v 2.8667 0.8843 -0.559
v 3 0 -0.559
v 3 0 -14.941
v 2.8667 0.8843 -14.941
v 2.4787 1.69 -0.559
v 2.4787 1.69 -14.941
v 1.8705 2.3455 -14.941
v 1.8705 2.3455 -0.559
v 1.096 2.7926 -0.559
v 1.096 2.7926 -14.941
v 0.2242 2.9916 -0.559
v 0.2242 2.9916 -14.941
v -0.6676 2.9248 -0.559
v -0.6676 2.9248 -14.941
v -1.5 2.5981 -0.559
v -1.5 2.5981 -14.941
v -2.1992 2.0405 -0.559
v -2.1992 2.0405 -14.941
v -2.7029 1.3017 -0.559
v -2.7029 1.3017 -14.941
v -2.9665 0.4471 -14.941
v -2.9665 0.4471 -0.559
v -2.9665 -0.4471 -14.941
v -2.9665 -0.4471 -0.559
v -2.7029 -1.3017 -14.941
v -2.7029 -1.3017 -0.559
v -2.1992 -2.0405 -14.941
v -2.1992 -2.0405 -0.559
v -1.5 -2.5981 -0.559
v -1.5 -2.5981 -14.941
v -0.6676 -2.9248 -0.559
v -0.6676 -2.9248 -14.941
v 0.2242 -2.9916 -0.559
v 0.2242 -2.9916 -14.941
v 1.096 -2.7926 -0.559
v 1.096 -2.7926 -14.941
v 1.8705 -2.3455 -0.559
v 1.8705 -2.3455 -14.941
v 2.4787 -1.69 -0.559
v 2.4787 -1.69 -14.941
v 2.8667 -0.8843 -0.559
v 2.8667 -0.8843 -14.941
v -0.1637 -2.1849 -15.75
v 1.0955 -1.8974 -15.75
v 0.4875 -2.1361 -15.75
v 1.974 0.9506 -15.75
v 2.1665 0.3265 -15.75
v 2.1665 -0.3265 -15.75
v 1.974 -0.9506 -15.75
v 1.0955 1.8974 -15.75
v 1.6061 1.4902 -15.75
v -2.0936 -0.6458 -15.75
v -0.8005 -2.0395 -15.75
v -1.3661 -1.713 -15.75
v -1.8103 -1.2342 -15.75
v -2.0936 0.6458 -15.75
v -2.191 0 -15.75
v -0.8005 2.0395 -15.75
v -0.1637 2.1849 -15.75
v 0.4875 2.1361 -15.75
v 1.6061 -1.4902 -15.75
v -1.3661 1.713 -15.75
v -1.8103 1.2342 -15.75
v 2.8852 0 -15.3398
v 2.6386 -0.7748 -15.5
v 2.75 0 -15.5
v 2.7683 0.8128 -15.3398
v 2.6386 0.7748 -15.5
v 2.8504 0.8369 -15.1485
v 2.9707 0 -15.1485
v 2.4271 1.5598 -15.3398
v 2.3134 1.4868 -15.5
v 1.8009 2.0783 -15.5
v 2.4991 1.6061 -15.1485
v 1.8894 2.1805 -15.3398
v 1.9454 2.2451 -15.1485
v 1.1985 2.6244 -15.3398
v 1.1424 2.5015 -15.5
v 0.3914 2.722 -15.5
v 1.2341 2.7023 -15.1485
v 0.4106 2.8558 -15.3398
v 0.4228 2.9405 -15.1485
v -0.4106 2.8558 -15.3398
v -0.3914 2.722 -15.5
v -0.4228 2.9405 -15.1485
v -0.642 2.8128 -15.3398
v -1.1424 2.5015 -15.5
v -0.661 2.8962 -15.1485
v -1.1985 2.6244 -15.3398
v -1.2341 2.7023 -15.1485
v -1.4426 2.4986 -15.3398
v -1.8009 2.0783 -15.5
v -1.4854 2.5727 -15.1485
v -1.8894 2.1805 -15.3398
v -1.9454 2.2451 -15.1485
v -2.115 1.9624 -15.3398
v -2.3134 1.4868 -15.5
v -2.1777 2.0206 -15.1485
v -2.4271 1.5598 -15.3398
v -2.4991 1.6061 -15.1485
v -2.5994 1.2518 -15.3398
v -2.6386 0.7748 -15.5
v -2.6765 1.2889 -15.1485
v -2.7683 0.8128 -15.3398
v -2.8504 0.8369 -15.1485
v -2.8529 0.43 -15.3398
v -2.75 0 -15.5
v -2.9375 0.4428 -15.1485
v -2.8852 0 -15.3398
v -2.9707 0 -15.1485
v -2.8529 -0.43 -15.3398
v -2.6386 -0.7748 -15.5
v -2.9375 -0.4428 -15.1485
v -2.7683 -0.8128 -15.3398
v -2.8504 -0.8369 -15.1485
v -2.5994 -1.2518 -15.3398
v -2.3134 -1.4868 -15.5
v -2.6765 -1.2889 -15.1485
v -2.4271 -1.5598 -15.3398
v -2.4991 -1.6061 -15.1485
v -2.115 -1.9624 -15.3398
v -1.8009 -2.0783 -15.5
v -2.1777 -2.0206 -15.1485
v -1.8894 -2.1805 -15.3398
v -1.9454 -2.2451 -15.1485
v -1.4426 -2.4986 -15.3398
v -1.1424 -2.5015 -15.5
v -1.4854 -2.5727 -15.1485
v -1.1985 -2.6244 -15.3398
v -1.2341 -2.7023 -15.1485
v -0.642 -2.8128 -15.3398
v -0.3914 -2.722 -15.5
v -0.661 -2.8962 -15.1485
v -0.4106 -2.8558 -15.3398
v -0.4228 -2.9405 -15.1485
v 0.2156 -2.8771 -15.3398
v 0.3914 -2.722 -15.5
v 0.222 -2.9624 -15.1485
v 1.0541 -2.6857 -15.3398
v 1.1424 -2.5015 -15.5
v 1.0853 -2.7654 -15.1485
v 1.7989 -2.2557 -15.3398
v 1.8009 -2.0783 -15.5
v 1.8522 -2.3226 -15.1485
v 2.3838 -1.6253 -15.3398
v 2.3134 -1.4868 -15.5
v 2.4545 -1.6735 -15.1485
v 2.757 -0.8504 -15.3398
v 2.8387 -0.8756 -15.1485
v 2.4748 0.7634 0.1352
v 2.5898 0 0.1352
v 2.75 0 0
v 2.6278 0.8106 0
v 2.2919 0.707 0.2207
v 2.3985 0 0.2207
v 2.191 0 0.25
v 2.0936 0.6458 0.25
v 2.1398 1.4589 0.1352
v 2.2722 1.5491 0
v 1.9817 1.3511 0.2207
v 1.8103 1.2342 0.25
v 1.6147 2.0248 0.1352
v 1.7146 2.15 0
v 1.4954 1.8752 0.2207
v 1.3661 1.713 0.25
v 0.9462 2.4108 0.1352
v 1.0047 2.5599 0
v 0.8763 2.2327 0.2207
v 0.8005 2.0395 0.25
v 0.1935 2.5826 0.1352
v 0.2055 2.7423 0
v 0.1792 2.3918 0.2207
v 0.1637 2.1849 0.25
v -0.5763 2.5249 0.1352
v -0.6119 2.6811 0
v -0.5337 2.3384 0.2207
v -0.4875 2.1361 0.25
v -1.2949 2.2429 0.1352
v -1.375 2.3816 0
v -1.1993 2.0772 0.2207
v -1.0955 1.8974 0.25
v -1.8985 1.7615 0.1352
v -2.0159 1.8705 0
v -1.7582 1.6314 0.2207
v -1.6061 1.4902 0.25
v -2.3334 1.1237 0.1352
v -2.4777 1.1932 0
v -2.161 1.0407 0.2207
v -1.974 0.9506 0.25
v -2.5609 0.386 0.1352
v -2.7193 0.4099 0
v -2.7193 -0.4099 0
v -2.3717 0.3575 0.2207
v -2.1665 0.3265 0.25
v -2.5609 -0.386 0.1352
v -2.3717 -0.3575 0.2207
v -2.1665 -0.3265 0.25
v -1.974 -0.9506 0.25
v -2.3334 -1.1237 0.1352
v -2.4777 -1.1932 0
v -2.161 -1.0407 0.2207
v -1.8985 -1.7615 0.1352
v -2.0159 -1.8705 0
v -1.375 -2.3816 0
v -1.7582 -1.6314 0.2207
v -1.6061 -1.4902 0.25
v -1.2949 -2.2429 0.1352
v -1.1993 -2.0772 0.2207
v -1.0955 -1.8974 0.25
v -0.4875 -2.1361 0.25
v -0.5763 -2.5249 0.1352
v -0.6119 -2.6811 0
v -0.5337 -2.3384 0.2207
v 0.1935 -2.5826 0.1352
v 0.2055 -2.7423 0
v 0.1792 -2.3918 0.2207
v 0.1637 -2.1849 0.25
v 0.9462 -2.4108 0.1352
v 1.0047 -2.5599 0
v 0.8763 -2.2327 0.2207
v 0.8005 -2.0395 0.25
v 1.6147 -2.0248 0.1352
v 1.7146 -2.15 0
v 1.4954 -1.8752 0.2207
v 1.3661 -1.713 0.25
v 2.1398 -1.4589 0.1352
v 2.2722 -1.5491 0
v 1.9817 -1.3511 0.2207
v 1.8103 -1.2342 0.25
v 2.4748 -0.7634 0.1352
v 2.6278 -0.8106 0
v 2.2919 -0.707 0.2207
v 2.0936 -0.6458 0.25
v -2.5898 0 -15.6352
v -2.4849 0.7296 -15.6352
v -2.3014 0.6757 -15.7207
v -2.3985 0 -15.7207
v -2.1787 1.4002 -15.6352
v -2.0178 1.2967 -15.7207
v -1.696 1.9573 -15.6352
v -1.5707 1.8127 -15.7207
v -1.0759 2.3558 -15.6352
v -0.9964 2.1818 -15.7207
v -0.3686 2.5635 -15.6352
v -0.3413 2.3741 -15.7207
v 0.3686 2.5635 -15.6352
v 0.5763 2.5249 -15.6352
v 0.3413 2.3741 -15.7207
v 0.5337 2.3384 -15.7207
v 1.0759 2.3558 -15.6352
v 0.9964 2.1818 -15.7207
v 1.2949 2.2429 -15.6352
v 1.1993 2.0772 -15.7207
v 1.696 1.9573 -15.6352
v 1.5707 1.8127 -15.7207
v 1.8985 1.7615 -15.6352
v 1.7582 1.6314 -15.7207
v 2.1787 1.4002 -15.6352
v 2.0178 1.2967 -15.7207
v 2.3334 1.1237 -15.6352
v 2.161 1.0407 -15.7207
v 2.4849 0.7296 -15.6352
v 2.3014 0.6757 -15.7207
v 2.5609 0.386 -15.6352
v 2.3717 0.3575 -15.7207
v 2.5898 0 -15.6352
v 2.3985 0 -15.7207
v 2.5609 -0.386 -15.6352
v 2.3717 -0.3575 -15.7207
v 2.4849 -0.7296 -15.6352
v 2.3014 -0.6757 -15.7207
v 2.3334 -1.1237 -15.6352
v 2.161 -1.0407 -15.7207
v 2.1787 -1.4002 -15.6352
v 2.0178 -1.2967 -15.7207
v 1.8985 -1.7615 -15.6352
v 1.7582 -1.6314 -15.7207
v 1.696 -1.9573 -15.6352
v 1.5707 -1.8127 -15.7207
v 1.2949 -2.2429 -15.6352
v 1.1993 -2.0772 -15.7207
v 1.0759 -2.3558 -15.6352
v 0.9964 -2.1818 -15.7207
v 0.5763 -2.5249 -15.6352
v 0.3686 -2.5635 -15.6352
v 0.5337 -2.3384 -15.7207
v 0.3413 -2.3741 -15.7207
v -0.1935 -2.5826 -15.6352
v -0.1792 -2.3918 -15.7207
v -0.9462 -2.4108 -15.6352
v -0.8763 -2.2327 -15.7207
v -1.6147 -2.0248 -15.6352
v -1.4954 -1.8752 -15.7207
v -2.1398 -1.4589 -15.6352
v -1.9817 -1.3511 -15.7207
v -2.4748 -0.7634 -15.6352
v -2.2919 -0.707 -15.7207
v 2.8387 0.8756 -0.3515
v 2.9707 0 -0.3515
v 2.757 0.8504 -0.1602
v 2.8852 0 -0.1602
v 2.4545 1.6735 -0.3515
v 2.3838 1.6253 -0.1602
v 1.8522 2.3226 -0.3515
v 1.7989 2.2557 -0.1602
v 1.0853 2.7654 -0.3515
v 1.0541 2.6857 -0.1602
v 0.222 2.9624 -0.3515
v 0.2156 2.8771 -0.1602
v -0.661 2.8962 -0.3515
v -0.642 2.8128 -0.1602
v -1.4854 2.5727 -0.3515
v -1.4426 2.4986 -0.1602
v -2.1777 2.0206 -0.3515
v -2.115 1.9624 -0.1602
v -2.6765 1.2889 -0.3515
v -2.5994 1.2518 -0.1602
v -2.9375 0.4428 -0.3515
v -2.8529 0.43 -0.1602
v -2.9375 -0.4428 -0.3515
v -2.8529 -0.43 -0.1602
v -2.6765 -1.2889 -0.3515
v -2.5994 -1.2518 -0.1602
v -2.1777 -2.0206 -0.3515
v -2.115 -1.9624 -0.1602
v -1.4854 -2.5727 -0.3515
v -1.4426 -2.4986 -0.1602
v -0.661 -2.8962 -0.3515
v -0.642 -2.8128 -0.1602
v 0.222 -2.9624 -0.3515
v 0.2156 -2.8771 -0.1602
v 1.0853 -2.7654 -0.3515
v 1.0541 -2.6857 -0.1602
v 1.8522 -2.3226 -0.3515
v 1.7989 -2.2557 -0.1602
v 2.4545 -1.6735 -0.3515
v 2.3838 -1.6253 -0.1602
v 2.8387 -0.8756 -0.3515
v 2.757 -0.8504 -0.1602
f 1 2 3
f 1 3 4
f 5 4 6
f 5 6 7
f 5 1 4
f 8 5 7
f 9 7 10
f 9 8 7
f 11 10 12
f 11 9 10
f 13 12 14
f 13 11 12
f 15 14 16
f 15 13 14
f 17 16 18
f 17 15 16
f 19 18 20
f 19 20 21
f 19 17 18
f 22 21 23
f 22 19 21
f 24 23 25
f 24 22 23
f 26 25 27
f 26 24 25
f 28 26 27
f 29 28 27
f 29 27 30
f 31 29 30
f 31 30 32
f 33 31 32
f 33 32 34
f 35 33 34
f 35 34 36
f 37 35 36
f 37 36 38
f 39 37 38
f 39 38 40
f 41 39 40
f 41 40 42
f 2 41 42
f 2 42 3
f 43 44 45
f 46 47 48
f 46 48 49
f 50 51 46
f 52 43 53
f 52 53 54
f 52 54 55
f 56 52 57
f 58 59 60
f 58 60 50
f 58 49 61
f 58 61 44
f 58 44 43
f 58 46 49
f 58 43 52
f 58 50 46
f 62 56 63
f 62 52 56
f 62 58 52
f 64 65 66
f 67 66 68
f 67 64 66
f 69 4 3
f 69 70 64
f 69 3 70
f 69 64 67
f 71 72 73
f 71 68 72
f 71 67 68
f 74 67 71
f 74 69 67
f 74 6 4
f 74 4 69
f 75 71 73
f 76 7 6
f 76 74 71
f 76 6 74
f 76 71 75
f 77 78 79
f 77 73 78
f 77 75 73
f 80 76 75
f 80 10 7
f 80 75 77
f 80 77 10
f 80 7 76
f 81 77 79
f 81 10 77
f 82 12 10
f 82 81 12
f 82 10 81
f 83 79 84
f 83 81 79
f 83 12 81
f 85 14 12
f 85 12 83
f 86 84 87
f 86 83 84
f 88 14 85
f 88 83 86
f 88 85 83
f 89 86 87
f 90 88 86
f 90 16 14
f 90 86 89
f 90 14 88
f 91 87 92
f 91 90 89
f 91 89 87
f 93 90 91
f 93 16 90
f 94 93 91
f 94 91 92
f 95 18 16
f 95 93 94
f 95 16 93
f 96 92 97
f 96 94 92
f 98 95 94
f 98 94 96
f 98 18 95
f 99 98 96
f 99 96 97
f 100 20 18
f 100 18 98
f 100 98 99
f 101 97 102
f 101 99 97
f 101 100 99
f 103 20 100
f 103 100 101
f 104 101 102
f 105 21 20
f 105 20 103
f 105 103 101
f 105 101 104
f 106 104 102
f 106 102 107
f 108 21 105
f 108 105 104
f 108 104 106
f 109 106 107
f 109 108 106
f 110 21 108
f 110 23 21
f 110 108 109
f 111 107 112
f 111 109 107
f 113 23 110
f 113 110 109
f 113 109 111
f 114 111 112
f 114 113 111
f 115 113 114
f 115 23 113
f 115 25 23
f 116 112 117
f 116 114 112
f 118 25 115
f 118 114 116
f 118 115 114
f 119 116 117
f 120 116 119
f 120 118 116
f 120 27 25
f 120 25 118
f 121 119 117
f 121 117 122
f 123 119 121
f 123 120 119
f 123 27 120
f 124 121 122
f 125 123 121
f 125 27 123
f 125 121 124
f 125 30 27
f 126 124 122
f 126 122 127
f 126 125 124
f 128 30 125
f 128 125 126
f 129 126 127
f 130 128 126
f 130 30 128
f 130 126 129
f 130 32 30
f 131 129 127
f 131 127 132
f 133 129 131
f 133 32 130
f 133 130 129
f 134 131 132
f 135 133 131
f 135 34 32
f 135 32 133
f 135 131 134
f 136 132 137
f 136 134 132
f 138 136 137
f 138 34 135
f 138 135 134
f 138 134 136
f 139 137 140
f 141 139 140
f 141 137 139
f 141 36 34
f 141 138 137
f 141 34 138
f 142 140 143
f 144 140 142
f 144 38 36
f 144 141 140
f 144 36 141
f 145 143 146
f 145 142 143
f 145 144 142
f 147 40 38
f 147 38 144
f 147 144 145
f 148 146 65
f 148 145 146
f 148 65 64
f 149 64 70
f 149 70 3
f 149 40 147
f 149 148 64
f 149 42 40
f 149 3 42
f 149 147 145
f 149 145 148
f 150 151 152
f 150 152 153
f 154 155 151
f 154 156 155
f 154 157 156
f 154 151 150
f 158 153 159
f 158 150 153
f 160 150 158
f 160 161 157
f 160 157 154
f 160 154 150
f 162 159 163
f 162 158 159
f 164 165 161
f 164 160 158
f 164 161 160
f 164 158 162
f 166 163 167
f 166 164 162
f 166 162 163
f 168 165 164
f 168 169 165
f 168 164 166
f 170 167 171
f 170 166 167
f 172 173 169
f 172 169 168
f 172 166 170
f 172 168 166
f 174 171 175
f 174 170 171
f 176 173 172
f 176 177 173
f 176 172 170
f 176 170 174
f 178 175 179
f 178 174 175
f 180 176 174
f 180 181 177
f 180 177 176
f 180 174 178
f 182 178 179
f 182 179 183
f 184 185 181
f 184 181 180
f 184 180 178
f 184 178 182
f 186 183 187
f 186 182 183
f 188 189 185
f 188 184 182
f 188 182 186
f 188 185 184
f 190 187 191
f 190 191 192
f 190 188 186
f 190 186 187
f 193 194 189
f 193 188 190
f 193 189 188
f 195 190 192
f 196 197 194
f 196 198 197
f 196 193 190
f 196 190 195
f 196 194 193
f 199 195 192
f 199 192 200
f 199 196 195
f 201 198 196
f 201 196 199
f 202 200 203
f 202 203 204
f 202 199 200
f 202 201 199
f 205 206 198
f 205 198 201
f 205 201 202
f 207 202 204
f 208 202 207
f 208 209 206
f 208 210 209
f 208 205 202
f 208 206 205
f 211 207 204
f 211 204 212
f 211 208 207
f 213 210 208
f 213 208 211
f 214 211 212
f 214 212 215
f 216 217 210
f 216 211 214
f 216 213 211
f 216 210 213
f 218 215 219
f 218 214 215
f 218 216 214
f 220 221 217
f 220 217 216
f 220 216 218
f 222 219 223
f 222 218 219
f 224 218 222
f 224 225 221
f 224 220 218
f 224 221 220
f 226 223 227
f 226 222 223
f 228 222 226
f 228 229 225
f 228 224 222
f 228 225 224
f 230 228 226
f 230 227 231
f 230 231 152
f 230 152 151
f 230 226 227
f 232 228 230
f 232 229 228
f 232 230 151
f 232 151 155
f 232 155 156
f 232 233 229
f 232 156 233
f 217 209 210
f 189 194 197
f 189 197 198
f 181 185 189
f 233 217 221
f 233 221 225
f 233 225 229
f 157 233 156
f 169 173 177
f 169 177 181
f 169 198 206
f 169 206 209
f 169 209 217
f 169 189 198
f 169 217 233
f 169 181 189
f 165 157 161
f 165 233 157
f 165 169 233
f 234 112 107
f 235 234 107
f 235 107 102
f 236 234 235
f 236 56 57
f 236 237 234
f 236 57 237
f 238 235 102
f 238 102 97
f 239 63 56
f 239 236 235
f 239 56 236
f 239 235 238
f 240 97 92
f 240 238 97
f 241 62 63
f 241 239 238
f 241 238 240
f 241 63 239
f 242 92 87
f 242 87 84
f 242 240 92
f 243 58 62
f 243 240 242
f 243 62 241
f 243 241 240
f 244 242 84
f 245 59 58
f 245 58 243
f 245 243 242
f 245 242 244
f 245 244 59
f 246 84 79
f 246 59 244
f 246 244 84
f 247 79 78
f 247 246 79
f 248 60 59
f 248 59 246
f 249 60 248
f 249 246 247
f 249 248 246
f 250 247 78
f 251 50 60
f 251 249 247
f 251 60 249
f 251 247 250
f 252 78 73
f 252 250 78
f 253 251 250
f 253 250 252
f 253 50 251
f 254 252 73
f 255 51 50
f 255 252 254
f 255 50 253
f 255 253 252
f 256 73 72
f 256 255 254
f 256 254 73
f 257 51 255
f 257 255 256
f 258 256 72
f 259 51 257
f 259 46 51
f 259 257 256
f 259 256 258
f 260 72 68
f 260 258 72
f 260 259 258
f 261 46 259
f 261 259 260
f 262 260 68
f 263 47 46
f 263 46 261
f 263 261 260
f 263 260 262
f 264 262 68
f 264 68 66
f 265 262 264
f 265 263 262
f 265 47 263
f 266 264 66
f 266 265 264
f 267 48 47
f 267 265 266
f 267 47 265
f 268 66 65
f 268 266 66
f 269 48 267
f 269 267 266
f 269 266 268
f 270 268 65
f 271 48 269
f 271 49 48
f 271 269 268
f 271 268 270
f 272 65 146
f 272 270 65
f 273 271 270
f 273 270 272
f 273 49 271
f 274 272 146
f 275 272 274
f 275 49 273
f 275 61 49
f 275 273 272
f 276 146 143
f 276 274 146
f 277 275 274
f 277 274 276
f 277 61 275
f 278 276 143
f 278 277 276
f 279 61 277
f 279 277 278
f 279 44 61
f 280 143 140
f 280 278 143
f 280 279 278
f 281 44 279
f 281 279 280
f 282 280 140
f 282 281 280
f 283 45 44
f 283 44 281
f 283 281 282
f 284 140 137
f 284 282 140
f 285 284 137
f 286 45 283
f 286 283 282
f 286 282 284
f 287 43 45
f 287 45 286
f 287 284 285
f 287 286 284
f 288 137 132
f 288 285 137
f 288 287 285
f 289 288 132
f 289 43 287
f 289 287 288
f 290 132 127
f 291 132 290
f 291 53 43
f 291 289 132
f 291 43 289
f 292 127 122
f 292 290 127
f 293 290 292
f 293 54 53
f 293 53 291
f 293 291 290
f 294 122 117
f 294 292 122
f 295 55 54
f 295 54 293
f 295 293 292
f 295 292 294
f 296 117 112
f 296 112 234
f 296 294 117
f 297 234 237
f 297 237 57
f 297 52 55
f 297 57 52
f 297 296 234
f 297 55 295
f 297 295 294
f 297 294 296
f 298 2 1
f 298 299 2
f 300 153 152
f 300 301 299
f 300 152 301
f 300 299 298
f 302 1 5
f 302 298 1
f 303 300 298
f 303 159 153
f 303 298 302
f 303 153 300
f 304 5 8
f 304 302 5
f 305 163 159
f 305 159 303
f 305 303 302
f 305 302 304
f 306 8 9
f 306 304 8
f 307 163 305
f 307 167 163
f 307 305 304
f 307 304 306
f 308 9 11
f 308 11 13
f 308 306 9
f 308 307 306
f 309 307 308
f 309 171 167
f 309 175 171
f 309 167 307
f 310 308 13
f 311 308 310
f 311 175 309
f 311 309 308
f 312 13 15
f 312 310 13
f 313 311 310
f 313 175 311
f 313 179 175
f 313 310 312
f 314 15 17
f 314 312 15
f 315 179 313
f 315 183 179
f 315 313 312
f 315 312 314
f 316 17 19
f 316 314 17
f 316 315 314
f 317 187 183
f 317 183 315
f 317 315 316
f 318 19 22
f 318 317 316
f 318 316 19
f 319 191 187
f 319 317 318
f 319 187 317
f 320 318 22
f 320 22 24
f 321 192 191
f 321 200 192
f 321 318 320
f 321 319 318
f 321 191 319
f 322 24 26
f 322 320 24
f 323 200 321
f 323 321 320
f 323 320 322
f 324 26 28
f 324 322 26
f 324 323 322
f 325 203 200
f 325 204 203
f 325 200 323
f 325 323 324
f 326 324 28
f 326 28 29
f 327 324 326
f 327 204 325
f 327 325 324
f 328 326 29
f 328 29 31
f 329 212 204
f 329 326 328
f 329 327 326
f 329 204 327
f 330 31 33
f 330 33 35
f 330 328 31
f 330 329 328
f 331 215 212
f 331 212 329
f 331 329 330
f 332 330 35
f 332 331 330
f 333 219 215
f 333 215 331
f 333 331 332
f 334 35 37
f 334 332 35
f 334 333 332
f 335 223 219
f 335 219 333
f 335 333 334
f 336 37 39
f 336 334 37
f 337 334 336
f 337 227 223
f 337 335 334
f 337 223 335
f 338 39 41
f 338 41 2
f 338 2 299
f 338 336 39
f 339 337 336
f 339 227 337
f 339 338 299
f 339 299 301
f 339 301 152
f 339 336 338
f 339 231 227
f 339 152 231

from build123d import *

# Parameters (mm, degrees)
SKETCH2_R           = 3
BOSS_EXTRUDE1_DEPTH = 15.5
SKETCH5_R           = 2.75
BOSS_EXTRUDE2_DEPTH = 0.25
FILLET3_R           = 0.75
SKETCH6_R           = 2.75
BOSS_EXTRUDE3_DEPTH = 0.25
FILLET4_R           = 0.75


with BuildPart() as part:
    # Sketch2 → Boss-Extrude1 (new body)
    with BuildSketch(Plane.XY):
        Circle(SKETCH2_R)
    extrude(amount=-BOSS_EXTRUDE1_DEPTH)

    # Sketch5 → Boss-Extrude2 (add)
    with BuildSketch(Plane.XY):
        Circle(SKETCH5_R)
    extrude(amount=BOSS_EXTRUDE2_DEPTH)

    # Fillet3
    # the kernel refuses this fillet: 0.75 mm, written as the material it takes off along each edge
    with BuildSketch(Plane(origin=(0, 0, 0), x_dir=(1, 0, 0), z_dir=(0, -1, 0))) as fillet3_piece_1:
        with BuildLine():
            CenterArc((2.25, -0.559016994), FILLET3_R, 0, 48.189685104)
            Line((2.75, 0), (2.76, 0.01118034))
            ThreePointArc((2.76, 0.01118034), (2.875, 0.015), (3, 0.015))
            Line((3, 0.015), (3.015, 0))
            Line((3.015, 0), (3.015, -0.559016994))
            Line((3.015, -0.559016994), (3, -0.559016994))
        make_face()
    revolve(axis=Axis((0, 0, 0), (0, 0, 1)), mode=Mode.SUBTRACT)
    with BuildSketch(Plane(origin=(0, 0, 0.25), x_dir=(1, 0, 0), z_dir=(0, -1, 0))) as fillet3_piece_2:
        with BuildLine():
            CenterArc((2.190983006, -0.75), FILLET3_R, 41.810314896, 48.189685104)
            Line((2.190983006, 0), (2.190983006, 0.015))
            Line((2.190983006, 0.015), (2.75, 0.015))
            Line((2.75, 0.015), (2.765, 0))
            ThreePointArc((2.765, 0), (2.765, -0.125), (2.76118034, -0.24))
            Line((2.76118034, -0.24), (2.75, -0.25))
        make_face()
    revolve(axis=Axis((0, 0, 0.25), (0, 0, 1)), mode=Mode.SUBTRACT)

    # Sketch6 → Boss-Extrude3 (add)
    with BuildSketch(Plane(origin=(0, 0, -15.5), x_dir=(-1, 0, 0), z_dir=(0, 0, -1))):
        Circle(SKETCH6_R)
    extrude(amount=BOSS_EXTRUDE3_DEPTH)

    # Fillet4
    # the kernel refuses this fillet: 0.75 mm, written as the material it takes off along each edge
    with BuildSketch(Plane(origin=(0, 0, -15.75), x_dir=(-1, 0, 0), z_dir=(0, -1, 0))) as fillet4_piece_1:
        with BuildLine():
            CenterArc((2.190983006, -0.75), FILLET4_R, 41.810314896, 48.189685104)
            Line((2.190983006, 0), (2.190983006, 0.015))
            Line((2.190983006, 0.015), (2.75, 0.015))
            Line((2.75, 0.015), (2.765, 0))
            ThreePointArc((2.765, 0), (2.765, -0.125), (2.76118034, -0.24))
            Line((2.76118034, -0.24), (2.75, -0.25))
        make_face()
    revolve(axis=Axis((0, 0, -15.75), (0, 0, -1)), mode=Mode.SUBTRACT)
    with BuildSketch(Plane(origin=(0, 0, -15.5), x_dir=(1, 0, 0), z_dir=(0, -1, 0))) as fillet4_piece_2:
        with BuildLine():
            CenterArc((2.25, 0.559016994), FILLET4_R, 311.810314896, 48.189685104)
            Line((2.75, 0), (2.76, -0.01118034))
            ThreePointArc((2.76, -0.01118034), (2.875, -0.015), (3, -0.015))
            Line((3, -0.015), (3.015, 0))
            Line((3.015, 0), (3.015, 0.559016994))
            Line((3.015, 0.559016994), (3, 0.559016994))
        make_face()
    revolve(axis=Axis((0, 0, -15.5), (0, 0, 1)), mode=Mode.SUBTRACT)


solid = part.part
